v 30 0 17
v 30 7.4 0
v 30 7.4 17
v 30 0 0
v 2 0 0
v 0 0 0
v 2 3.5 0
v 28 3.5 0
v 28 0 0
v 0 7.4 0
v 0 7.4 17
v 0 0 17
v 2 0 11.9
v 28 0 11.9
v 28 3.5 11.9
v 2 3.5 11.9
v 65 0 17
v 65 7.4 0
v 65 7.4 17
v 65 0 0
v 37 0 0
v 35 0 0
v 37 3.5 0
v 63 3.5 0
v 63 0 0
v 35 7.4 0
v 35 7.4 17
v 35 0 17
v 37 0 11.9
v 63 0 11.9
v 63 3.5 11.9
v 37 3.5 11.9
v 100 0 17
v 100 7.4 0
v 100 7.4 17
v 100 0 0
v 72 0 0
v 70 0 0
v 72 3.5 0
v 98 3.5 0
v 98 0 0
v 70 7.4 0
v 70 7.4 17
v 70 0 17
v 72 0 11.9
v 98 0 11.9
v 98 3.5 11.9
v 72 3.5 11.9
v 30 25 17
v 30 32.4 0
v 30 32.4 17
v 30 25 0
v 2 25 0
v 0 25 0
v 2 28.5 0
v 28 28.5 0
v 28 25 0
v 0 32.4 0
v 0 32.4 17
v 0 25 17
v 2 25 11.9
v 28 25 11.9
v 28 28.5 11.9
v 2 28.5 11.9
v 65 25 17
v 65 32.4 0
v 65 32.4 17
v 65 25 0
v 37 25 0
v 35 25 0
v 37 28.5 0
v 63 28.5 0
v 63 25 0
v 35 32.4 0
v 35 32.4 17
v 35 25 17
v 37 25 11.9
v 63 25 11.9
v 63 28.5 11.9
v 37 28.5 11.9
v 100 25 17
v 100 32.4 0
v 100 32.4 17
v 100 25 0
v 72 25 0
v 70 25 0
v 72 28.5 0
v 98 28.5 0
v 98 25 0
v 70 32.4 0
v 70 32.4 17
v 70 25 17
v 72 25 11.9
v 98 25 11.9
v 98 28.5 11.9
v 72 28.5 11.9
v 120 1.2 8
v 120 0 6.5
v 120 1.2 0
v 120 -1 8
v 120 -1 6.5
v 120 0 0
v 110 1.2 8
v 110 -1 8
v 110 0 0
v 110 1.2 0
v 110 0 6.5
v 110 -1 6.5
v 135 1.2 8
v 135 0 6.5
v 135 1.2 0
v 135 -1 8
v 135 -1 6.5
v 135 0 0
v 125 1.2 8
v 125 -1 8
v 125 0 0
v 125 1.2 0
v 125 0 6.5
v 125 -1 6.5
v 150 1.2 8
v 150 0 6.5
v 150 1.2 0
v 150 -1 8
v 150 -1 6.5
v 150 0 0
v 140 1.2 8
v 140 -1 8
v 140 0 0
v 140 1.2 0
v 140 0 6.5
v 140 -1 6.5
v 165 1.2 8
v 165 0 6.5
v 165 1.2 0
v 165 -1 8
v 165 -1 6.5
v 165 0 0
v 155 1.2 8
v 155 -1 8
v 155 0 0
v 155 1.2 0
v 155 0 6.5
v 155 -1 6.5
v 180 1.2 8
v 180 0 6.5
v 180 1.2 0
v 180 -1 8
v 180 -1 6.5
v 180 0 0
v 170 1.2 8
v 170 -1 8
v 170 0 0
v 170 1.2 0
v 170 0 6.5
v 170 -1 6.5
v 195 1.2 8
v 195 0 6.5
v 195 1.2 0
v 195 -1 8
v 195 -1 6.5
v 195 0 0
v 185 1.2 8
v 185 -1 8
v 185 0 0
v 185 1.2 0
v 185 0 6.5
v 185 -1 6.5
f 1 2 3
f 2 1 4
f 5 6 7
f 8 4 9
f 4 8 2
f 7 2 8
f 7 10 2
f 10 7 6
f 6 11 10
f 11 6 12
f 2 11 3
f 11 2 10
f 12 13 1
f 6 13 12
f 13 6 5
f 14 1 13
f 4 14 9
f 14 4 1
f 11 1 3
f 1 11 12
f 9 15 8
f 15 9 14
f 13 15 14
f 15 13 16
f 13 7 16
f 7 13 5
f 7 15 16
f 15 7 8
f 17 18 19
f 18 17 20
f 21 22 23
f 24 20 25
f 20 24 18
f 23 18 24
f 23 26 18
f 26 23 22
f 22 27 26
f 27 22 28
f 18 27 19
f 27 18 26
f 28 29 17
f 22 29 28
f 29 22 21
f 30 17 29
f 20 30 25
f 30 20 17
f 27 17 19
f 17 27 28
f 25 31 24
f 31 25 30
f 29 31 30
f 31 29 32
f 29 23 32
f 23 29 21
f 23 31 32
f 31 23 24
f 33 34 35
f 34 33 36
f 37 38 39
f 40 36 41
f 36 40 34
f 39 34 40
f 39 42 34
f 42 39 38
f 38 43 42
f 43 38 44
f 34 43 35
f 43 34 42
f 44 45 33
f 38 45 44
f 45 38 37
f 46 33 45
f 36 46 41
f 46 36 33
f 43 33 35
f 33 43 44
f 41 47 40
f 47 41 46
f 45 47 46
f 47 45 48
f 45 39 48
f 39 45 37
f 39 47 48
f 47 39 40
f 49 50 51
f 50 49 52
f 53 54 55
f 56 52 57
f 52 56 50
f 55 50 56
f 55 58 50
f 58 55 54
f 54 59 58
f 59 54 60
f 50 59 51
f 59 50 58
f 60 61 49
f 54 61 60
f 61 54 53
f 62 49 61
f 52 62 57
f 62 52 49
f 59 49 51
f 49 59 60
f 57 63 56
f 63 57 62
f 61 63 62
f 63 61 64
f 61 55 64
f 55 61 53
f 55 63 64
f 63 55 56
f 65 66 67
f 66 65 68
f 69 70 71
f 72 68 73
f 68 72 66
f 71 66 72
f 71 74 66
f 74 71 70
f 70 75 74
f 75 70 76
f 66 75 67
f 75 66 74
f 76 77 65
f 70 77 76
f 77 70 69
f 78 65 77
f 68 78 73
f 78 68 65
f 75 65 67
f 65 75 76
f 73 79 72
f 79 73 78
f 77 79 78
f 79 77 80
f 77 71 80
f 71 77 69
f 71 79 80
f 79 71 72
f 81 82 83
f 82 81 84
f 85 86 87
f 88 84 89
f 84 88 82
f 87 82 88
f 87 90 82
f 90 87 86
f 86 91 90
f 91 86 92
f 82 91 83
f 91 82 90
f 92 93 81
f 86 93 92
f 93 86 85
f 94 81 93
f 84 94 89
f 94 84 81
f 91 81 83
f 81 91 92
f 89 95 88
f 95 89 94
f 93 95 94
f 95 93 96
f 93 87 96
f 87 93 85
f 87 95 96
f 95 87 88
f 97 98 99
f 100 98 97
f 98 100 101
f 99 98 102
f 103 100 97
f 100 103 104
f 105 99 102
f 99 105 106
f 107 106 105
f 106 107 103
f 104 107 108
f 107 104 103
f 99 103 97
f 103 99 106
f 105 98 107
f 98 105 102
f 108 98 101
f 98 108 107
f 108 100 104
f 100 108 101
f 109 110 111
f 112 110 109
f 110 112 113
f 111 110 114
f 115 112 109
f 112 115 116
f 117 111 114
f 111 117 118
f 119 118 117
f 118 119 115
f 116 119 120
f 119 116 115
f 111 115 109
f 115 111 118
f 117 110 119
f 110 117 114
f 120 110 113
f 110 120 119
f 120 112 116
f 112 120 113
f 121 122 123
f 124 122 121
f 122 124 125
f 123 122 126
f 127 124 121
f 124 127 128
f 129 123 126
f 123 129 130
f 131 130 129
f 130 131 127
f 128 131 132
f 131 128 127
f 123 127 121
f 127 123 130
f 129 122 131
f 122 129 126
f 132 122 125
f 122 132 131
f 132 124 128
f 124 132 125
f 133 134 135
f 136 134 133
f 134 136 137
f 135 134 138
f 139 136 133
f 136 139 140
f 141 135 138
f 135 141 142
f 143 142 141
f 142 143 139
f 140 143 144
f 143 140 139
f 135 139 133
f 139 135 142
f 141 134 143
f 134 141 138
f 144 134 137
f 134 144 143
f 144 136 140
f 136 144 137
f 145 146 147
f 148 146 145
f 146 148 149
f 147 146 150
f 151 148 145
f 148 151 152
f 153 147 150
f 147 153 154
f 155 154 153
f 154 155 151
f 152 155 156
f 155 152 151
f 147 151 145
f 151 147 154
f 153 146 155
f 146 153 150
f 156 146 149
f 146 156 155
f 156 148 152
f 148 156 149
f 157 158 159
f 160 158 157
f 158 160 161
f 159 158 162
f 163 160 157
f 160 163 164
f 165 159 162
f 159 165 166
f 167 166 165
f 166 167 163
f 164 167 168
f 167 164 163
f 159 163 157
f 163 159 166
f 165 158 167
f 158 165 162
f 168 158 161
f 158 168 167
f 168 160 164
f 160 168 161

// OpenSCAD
// ============================================================
// PRINT: ACESSÓRIOS — Puxadores + Travas
// 6× puxadores (30×7.4×17mm) + 6× travas (10×2.2×8mm)
// Mesa: ~200mm × 33mm — cabe na Ender 3 (200×200mm) ✓
// Tempo estimado: ~45min
// ============================================================

use <TRILHO_FILTRO.scad>

gap = 3;

// 6 puxadores em 2 fileiras de 3
for (i = [0:2]) {
    translate([i * 35, 0, 0])
        puxador();
}
for (i = [0:2]) {
    translate([i * 35, 25, 0])
        puxador();
}

// 6 travas ao lado dos puxadores
for (i = [0:5]) {
    translate([110 + i * 15, 0, 0])
        trava();
}

// Guia visual da mesa (não imprime)
%translate([0, 0, -0.5])
    cube([200, 200, 0.1]);
